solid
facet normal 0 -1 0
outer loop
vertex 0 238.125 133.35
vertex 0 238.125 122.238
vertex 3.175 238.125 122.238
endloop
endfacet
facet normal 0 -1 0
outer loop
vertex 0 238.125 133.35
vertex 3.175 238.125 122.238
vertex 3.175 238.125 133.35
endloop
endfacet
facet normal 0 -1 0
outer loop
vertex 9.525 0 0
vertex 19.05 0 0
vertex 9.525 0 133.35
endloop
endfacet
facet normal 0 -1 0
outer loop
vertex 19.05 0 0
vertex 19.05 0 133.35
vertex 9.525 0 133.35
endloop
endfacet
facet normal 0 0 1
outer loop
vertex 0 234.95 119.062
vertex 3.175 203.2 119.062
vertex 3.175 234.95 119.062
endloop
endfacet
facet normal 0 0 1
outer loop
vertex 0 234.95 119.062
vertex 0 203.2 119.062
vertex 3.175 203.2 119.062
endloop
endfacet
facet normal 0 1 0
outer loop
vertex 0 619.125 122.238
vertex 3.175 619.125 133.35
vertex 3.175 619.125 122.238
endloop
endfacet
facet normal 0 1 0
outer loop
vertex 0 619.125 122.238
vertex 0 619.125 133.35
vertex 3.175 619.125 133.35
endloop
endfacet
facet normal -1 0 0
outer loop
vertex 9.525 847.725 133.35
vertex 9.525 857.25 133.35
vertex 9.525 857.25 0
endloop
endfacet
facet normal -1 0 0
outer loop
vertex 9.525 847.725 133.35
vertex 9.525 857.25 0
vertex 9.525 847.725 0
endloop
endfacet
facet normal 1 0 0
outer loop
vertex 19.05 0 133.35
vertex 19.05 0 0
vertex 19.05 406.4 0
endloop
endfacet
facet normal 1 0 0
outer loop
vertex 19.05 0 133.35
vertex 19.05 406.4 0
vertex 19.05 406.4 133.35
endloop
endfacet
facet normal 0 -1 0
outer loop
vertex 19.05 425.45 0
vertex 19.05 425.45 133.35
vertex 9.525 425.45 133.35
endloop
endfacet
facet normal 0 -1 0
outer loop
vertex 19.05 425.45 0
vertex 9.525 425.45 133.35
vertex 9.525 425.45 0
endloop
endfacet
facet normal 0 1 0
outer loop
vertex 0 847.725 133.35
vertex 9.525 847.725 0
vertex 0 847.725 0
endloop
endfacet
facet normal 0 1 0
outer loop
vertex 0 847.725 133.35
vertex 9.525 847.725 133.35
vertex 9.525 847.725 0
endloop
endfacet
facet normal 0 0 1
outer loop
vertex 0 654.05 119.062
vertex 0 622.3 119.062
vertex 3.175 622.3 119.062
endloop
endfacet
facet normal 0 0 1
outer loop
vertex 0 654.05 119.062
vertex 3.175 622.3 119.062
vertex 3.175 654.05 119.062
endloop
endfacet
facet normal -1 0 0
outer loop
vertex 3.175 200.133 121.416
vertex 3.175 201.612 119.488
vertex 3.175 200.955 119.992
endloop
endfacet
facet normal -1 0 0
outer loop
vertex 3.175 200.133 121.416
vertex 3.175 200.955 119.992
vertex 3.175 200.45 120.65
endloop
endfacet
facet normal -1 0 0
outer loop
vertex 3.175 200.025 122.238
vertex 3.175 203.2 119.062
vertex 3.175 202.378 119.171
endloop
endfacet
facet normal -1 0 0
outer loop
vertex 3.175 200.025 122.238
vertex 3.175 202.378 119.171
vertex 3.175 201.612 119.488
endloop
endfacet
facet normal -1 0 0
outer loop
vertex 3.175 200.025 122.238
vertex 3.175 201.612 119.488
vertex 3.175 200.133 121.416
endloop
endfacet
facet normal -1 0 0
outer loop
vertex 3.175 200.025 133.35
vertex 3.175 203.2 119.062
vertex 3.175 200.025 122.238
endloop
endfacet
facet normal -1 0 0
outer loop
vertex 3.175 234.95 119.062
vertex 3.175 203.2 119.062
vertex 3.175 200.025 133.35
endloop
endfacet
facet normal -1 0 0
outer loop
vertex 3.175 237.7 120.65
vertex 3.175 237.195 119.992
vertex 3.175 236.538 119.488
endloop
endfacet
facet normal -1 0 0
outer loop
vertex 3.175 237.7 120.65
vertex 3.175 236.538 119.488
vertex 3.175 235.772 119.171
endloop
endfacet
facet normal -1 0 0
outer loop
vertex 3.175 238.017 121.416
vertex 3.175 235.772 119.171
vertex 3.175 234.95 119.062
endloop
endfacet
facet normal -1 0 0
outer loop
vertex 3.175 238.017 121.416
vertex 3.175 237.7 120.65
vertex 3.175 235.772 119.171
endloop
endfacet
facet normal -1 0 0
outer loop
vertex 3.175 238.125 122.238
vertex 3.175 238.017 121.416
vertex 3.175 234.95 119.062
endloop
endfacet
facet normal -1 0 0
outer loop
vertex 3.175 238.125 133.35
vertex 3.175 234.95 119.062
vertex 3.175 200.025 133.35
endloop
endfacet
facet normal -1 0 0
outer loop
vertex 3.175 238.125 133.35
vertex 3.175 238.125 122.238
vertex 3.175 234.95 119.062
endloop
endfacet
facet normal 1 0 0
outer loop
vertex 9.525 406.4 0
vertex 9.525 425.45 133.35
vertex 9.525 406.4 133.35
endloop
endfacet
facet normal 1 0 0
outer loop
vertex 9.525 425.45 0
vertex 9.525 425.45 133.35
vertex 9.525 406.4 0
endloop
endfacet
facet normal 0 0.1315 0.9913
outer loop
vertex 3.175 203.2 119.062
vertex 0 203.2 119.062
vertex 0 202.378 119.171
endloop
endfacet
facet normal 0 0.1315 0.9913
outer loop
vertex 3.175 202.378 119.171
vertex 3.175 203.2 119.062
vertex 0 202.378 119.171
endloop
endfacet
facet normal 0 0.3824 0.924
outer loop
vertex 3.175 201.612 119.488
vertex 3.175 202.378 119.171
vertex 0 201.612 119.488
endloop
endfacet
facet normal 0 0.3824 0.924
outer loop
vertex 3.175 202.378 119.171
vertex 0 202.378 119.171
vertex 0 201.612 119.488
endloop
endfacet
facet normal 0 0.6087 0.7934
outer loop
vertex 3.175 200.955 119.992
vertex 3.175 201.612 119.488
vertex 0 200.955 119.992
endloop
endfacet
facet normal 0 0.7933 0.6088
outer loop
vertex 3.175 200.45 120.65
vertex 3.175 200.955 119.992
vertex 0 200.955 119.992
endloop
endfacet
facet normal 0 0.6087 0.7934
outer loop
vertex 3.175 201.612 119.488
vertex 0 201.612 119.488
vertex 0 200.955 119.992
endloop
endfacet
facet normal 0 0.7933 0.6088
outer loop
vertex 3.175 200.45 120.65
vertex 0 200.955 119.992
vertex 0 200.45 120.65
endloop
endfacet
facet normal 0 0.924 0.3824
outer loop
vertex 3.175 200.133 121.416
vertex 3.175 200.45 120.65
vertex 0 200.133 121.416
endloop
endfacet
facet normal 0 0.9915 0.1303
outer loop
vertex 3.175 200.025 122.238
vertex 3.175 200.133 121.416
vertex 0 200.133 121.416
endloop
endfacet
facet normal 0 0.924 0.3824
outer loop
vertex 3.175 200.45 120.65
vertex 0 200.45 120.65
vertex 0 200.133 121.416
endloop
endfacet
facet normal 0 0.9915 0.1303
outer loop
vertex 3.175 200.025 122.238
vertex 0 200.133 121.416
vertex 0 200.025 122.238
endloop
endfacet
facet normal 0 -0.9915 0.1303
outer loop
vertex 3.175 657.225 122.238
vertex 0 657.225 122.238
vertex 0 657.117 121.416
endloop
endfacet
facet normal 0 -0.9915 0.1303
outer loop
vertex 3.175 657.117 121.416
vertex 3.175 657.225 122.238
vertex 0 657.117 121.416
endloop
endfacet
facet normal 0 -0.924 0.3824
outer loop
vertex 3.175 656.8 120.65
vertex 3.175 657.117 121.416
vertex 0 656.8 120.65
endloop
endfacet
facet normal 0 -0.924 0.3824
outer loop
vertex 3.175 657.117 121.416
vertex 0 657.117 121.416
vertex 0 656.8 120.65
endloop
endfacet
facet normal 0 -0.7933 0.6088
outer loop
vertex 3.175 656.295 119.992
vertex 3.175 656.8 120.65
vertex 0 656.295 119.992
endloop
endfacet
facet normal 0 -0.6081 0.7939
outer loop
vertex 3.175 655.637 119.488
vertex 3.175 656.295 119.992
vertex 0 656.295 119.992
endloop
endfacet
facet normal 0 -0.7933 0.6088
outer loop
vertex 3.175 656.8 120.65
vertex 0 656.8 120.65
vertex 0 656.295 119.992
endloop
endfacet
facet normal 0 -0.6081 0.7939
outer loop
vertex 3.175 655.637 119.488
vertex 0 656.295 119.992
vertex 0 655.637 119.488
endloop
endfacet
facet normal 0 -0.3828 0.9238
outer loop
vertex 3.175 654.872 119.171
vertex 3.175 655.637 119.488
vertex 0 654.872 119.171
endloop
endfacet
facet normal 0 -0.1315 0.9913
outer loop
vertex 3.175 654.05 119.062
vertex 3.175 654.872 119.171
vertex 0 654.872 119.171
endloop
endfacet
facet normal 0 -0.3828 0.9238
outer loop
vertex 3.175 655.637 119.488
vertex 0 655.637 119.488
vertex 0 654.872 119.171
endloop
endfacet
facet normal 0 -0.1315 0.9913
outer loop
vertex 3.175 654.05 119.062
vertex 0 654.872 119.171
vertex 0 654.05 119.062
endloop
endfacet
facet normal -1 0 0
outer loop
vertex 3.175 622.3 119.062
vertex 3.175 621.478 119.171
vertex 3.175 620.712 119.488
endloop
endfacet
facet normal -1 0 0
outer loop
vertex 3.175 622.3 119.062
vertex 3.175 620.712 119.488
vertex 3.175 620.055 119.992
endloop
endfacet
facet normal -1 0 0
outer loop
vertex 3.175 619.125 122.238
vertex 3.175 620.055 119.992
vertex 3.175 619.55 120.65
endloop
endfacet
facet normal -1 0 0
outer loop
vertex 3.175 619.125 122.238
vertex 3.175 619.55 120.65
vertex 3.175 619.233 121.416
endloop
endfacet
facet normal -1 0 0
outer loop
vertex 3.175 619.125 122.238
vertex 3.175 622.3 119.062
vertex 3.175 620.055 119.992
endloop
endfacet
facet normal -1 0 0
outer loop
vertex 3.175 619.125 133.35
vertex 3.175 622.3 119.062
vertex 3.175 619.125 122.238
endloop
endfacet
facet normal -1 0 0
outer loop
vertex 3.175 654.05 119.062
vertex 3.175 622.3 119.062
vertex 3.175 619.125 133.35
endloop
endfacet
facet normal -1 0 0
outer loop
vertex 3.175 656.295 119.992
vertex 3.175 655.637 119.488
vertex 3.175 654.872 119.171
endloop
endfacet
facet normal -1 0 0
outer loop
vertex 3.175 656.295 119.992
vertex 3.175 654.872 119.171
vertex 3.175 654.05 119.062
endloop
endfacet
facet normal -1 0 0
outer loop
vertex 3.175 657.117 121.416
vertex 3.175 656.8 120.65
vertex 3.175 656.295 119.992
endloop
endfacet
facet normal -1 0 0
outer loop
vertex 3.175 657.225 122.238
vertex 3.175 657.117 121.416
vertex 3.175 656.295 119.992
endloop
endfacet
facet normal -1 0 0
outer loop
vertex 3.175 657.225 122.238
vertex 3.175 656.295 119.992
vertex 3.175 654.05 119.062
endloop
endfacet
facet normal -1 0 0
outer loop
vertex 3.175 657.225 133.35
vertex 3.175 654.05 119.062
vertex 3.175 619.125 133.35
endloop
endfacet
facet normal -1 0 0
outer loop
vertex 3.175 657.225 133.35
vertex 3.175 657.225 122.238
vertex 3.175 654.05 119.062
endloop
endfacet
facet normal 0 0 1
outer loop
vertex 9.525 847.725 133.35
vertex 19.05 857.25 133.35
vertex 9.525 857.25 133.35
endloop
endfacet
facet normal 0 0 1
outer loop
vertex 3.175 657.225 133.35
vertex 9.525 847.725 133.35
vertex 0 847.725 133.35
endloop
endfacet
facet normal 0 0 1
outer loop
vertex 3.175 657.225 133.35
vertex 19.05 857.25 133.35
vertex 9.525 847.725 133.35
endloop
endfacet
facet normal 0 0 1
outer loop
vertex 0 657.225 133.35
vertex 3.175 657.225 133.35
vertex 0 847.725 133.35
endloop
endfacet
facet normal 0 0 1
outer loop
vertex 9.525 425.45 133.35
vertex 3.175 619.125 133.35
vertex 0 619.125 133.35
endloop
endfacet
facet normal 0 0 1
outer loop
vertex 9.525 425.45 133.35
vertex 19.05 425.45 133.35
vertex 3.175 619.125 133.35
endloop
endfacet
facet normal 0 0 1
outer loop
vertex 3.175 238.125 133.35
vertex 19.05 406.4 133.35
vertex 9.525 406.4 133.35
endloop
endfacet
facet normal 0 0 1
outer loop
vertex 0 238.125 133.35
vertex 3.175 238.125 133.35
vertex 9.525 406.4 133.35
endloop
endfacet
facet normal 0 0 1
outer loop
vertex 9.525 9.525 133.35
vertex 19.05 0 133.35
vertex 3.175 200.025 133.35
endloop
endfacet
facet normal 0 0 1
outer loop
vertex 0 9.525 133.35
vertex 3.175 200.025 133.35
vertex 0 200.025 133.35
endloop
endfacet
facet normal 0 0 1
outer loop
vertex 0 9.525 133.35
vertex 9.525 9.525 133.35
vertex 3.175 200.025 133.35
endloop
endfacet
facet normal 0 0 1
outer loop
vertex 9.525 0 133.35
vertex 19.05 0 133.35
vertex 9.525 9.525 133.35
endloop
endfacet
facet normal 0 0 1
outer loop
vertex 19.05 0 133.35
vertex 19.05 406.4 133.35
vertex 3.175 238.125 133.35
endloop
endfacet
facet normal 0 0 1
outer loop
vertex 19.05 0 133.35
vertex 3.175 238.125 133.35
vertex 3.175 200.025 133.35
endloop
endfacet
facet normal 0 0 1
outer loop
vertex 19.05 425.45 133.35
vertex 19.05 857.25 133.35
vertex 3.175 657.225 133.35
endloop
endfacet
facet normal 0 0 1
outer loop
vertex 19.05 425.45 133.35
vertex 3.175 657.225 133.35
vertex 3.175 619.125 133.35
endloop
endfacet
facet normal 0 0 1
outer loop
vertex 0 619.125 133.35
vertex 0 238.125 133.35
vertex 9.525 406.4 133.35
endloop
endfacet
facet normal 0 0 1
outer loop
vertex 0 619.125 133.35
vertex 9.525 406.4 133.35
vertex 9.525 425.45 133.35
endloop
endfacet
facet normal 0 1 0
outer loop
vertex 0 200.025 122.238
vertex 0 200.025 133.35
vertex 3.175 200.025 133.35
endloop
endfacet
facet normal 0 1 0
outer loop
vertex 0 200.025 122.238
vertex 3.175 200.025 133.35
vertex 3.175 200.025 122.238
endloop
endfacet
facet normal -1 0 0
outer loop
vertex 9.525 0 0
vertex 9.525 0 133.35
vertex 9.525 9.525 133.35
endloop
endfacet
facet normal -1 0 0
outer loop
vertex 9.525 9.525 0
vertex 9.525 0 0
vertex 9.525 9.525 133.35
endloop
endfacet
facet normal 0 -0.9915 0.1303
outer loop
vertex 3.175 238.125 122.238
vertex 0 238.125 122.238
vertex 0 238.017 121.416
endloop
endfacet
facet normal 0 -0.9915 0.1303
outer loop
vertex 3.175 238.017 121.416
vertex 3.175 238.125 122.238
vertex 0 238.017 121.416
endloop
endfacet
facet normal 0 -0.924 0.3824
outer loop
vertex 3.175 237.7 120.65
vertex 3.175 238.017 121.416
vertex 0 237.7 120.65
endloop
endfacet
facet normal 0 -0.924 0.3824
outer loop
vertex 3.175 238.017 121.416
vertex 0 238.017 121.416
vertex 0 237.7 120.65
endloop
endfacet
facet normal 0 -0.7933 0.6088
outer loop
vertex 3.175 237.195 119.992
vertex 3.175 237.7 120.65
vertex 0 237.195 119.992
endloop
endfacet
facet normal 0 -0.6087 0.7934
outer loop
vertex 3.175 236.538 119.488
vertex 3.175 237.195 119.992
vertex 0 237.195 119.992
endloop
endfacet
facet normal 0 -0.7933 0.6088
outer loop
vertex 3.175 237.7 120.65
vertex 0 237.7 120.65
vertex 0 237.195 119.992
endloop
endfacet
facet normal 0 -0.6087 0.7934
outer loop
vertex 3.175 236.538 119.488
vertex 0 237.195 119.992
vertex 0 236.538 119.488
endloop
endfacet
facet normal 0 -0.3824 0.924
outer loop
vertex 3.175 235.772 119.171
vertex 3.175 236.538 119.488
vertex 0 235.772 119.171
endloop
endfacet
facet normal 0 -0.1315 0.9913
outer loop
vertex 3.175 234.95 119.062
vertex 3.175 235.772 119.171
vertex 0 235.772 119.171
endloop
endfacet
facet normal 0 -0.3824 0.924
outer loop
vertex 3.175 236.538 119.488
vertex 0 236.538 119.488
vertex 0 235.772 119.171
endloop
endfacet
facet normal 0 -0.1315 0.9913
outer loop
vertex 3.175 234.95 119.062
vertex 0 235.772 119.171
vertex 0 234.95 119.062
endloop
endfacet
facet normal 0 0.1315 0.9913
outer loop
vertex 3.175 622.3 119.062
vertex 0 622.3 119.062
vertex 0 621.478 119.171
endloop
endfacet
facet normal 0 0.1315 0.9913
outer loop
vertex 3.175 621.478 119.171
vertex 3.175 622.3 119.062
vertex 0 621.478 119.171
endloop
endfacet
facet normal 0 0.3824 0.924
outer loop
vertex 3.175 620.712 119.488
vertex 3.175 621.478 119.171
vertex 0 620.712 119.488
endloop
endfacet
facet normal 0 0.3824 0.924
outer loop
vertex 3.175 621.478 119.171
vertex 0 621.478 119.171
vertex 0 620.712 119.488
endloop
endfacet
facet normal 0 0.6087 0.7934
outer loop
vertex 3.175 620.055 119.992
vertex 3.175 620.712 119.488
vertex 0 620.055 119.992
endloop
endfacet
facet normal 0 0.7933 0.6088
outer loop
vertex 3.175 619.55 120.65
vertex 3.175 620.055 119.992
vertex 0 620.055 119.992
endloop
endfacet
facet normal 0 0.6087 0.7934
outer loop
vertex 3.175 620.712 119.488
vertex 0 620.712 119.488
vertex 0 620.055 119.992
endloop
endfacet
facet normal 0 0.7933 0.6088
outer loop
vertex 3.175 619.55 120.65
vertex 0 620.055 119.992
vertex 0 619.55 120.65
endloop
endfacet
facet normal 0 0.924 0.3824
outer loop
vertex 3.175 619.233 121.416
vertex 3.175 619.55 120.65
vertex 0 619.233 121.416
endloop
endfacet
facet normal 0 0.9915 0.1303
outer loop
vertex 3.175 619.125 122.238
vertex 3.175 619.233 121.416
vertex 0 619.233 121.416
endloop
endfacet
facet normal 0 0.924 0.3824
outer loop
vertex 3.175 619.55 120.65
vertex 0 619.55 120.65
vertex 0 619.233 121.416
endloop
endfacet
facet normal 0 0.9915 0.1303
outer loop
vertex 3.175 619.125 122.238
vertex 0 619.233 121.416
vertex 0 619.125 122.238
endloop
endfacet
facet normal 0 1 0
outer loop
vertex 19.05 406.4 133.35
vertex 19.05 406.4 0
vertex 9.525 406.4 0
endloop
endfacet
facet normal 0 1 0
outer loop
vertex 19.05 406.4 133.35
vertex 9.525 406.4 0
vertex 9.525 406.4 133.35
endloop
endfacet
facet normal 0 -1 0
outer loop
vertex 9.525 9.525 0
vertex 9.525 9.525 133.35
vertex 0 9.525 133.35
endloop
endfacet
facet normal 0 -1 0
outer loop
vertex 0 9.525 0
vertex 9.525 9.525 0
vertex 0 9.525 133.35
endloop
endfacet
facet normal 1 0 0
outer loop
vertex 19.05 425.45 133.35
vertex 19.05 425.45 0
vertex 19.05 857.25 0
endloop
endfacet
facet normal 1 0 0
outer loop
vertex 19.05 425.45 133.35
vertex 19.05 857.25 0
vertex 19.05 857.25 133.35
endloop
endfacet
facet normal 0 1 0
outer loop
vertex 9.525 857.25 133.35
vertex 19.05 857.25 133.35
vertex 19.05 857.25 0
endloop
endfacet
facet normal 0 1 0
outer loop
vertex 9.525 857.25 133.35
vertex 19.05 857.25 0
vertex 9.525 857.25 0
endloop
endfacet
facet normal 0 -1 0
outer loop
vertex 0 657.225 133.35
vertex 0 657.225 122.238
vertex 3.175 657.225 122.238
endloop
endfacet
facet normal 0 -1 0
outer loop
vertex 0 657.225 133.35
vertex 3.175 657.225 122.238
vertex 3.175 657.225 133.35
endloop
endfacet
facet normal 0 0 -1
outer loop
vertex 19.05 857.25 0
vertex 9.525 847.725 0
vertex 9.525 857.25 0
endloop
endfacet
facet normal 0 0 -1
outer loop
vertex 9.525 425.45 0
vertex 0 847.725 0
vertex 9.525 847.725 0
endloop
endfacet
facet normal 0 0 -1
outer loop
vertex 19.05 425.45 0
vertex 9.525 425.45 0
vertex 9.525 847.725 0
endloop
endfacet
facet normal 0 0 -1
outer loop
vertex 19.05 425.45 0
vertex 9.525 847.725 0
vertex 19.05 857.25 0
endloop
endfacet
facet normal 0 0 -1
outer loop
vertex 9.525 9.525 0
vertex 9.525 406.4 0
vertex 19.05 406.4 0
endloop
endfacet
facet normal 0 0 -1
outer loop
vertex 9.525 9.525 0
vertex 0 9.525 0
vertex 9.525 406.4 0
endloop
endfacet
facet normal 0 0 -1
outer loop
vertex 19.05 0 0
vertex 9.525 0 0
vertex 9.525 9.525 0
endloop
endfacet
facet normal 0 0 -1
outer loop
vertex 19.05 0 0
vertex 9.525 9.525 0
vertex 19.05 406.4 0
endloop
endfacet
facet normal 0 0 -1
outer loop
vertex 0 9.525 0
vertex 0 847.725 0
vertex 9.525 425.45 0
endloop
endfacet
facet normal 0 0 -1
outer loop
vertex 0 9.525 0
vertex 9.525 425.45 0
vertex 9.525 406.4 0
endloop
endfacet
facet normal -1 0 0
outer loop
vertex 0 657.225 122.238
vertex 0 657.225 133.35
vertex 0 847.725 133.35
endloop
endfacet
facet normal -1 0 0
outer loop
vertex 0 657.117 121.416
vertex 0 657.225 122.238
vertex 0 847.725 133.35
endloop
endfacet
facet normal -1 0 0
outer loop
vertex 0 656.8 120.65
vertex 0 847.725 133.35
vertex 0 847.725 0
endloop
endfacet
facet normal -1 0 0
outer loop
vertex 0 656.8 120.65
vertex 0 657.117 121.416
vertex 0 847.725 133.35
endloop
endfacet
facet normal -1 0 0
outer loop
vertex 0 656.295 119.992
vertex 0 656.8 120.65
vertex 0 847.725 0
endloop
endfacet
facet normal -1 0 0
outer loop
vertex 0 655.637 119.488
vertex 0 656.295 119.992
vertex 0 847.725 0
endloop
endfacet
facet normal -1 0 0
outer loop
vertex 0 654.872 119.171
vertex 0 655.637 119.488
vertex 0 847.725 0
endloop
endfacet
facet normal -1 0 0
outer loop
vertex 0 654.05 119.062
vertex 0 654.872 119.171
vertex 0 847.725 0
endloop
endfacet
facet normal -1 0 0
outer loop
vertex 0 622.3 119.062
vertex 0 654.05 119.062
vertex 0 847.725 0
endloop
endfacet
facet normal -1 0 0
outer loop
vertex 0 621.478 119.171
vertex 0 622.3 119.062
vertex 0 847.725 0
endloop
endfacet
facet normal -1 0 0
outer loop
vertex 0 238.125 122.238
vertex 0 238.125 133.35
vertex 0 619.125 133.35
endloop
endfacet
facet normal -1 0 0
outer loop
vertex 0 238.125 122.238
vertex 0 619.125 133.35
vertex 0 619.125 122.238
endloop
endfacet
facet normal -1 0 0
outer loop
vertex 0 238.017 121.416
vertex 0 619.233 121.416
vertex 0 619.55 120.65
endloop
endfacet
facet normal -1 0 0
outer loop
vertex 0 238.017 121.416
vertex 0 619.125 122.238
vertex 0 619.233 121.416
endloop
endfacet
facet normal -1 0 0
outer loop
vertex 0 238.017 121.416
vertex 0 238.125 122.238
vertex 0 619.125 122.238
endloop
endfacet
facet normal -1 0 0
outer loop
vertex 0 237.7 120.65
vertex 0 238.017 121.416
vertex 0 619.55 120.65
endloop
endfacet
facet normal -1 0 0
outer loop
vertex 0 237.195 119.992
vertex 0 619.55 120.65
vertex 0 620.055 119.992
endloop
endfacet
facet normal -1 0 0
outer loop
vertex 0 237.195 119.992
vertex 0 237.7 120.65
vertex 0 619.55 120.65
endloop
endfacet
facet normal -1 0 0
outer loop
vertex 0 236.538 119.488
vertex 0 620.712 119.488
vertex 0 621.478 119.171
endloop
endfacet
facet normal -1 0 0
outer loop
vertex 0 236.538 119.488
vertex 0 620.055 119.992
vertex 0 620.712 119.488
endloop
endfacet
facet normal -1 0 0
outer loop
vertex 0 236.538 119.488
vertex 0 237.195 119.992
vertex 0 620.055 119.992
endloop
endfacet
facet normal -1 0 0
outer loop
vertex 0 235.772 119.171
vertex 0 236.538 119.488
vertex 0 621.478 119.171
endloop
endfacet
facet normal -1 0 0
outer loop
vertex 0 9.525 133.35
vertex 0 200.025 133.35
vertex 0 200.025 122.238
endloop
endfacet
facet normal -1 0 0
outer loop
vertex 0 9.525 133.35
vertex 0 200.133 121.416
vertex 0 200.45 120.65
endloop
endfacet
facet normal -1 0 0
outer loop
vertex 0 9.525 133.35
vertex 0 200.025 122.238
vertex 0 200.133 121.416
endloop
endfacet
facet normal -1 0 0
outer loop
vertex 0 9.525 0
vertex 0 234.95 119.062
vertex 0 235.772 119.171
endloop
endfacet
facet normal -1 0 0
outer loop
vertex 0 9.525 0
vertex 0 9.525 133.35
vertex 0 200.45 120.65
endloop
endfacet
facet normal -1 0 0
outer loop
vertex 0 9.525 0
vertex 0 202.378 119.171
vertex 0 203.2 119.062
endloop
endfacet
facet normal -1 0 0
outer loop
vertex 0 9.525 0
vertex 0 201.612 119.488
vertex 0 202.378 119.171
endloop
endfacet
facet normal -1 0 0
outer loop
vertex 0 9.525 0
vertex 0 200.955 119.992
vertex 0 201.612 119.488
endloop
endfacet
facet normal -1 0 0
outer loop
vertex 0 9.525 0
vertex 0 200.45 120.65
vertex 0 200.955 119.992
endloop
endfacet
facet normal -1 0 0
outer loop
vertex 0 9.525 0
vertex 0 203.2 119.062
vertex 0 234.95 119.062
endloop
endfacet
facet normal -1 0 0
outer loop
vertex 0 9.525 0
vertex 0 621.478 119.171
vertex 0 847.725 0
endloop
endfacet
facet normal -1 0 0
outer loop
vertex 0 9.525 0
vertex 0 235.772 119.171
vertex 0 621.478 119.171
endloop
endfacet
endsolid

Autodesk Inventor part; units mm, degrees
ref_plane "YZ Plane" through (0, 0, 0) normal (1, 0, 0) x (0, 1, 0)
ref_plane "XZ Plane" through (0, 0, 0) normal (0, 1, 0) x (-1, 0, 0)
ref_plane "XY Plane" through (0, 0, 0) normal (0, 0, 1) x (1, 0, 0)
sketch "Sketch1" plane through (0, 0, 0) normal (0, 1, 0) x (-1, 0, 0)
  line L0 (0, 0) -> (-19.05, 0)
  line L1 (-19.05, 0) -> (-19.05, 133.35)
  line L2 (-19.05, 133.35) -> (0, 133.35)
  line L3 (0, 133.35) -> (0, 0)
  dimension "d0" = 19.05
  dimension "d1" = 133.35
extrude "Board" add sketch "Sketch1" along normal blind 857.25
sketch "Sketch2" plane through (19.05, 0, 133.35) normal (1, 0, 0) x (0, 0, -1)
  line L0 (0, 425.45) -> (133.35, 425.45)
  line L1 (133.35, 425.45) -> (133.35, 406.4)
  line L2 (133.35, 406.4) -> (0, 406.4)
  line L3 (0, 406.4) -> (0, 425.45)
  line L4 (0, 0) -> (133.35, 0) projected
  line L5 (0, 0) -> (0, 857.25) projected
  line L6 (133.35, 0) -> (133.35, 857.25) projected
  dimension "d4" = 19.05
  dimension "d5" = 406.4
extrude "Shelf Notch" cut sketch "Sketch2" against normal blind 9.525 contours L0 L1 L2 L3
sketch "Sketch3" plane through (0, 0, 133.35) normal (0, 0, 1) x (1, 0, 0)
  line L0 (0, 857.25) -> (19.05, 857.25) projected
  line L1 (0, 857.25) -> (9.525, 857.25)
  line L2 (9.525, 857.25) -> (9.525, 847.725)
  line L3 (9.525, 847.725) -> (0, 847.725)
  line L4 (0, 847.725) -> (0, 857.25)
  line L5 (0, 0) -> (9.525, 0)
  line L6 (9.525, 0) -> (9.525, 9.525)
  line L7 (9.525, 9.525) -> (0, 9.525)
  line L8 (0, 9.525) -> (0, 0)
  dimension "d8" = 9.525
  dimension "d9" = 9.525
  dimension "d14" = 9.525
  dimension "d15" = 9.525
extrude "Top and Bottom Dados" cut sketch "Sketch3" against normal blind 133.35
sketch "Sketch5" plane through (0, 9.525, 0) normal (-1, 0, 0) x (0, 0, 1)
  line L0 (122.2375, 647.7) -> (133.35, 647.7)
  line L1 (133.35, 647.7) -> (133.35, 609.6)
  line L2 (133.35, 609.6) -> (122.2375, 609.6)
  line L3 (119.0625, 612.775) -> (119.0625, 644.525)
  line L4 (133.35, 838.2) -> (0, 838.2) projected
  line L5 (133.35, 0) -> (133.35, 838.2) projected
  line L6 (122.2375, 228.6) -> (133.35, 228.6)
  line L7 (133.35, 228.6) -> (133.35, 190.5)
  line L8 (133.35, 190.5) -> (122.2375, 190.5)
  line L9 (119.0625, 193.675) -> (119.0625, 225.425)
  line L10 (0, 0) -> (133.35, 0) projected
  arc A0 (122.2375, 647.7) -> (119.0625, 644.525) centre (122.2375, 644.525) ccw
  arc A1 (119.0625, 612.775) -> (122.2375, 609.6) centre (122.2375, 612.775) ccw
  arc A2 (122.2375, 228.6) -> (119.0625, 225.425) centre (122.2375, 225.425) ccw
  arc A3 (119.0625, 193.675) -> (122.2375, 190.5) centre (122.2375, 193.675) ccw
  point P0 (0, -9.525)
  point P1 (119.0625, 609.6)
  point P2 (119.0625, 190.5)
  dimension "d16" = 14.2875
  dimension "d17" = 38.1
  dimension "d18" = 838.2
  dimension "d19" = 190.5
  dimension "d20" = 38.1
  dimension "d21" = 14.2875
  dimension "d22" = 381
  dimension "d24" = 3.175
extrude "Hinge" cut sketch "Sketch5" against normal blind 3.175
equation "\"d12\" = d1"
equation "\"d19\" = 0.25 * d18 - 0.5 * d17"
equation "\"d20\" = d17"
equation "\"d21\" = d16"
equation "\"d22\" = 2 * d19"
properties part number "Door Side"
